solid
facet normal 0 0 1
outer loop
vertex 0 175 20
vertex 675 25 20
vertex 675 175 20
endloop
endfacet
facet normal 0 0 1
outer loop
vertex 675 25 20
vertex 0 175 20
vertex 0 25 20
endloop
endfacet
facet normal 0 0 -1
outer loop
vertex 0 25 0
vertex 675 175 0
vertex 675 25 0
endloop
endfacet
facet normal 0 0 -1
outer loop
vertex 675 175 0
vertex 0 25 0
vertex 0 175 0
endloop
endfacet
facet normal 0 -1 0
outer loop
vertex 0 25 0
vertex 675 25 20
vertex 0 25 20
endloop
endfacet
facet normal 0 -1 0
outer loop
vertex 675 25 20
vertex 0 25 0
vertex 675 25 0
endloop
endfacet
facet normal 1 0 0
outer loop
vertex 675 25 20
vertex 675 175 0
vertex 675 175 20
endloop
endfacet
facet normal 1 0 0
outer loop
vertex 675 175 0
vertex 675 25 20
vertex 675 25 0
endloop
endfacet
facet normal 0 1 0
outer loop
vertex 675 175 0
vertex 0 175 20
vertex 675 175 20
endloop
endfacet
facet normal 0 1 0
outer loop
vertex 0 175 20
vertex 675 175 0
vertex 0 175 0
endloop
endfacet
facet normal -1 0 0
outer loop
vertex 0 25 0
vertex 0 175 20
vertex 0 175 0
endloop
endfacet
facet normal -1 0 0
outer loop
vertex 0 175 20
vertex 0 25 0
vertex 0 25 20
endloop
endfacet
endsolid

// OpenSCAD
linear_extrude(file = "nuvodia_plain.dxf", height = 40);
linear_extrude(file = "nuvodia_o.dxf", height = 35);

translate([0,25,0])
cube([675,150,20]);
